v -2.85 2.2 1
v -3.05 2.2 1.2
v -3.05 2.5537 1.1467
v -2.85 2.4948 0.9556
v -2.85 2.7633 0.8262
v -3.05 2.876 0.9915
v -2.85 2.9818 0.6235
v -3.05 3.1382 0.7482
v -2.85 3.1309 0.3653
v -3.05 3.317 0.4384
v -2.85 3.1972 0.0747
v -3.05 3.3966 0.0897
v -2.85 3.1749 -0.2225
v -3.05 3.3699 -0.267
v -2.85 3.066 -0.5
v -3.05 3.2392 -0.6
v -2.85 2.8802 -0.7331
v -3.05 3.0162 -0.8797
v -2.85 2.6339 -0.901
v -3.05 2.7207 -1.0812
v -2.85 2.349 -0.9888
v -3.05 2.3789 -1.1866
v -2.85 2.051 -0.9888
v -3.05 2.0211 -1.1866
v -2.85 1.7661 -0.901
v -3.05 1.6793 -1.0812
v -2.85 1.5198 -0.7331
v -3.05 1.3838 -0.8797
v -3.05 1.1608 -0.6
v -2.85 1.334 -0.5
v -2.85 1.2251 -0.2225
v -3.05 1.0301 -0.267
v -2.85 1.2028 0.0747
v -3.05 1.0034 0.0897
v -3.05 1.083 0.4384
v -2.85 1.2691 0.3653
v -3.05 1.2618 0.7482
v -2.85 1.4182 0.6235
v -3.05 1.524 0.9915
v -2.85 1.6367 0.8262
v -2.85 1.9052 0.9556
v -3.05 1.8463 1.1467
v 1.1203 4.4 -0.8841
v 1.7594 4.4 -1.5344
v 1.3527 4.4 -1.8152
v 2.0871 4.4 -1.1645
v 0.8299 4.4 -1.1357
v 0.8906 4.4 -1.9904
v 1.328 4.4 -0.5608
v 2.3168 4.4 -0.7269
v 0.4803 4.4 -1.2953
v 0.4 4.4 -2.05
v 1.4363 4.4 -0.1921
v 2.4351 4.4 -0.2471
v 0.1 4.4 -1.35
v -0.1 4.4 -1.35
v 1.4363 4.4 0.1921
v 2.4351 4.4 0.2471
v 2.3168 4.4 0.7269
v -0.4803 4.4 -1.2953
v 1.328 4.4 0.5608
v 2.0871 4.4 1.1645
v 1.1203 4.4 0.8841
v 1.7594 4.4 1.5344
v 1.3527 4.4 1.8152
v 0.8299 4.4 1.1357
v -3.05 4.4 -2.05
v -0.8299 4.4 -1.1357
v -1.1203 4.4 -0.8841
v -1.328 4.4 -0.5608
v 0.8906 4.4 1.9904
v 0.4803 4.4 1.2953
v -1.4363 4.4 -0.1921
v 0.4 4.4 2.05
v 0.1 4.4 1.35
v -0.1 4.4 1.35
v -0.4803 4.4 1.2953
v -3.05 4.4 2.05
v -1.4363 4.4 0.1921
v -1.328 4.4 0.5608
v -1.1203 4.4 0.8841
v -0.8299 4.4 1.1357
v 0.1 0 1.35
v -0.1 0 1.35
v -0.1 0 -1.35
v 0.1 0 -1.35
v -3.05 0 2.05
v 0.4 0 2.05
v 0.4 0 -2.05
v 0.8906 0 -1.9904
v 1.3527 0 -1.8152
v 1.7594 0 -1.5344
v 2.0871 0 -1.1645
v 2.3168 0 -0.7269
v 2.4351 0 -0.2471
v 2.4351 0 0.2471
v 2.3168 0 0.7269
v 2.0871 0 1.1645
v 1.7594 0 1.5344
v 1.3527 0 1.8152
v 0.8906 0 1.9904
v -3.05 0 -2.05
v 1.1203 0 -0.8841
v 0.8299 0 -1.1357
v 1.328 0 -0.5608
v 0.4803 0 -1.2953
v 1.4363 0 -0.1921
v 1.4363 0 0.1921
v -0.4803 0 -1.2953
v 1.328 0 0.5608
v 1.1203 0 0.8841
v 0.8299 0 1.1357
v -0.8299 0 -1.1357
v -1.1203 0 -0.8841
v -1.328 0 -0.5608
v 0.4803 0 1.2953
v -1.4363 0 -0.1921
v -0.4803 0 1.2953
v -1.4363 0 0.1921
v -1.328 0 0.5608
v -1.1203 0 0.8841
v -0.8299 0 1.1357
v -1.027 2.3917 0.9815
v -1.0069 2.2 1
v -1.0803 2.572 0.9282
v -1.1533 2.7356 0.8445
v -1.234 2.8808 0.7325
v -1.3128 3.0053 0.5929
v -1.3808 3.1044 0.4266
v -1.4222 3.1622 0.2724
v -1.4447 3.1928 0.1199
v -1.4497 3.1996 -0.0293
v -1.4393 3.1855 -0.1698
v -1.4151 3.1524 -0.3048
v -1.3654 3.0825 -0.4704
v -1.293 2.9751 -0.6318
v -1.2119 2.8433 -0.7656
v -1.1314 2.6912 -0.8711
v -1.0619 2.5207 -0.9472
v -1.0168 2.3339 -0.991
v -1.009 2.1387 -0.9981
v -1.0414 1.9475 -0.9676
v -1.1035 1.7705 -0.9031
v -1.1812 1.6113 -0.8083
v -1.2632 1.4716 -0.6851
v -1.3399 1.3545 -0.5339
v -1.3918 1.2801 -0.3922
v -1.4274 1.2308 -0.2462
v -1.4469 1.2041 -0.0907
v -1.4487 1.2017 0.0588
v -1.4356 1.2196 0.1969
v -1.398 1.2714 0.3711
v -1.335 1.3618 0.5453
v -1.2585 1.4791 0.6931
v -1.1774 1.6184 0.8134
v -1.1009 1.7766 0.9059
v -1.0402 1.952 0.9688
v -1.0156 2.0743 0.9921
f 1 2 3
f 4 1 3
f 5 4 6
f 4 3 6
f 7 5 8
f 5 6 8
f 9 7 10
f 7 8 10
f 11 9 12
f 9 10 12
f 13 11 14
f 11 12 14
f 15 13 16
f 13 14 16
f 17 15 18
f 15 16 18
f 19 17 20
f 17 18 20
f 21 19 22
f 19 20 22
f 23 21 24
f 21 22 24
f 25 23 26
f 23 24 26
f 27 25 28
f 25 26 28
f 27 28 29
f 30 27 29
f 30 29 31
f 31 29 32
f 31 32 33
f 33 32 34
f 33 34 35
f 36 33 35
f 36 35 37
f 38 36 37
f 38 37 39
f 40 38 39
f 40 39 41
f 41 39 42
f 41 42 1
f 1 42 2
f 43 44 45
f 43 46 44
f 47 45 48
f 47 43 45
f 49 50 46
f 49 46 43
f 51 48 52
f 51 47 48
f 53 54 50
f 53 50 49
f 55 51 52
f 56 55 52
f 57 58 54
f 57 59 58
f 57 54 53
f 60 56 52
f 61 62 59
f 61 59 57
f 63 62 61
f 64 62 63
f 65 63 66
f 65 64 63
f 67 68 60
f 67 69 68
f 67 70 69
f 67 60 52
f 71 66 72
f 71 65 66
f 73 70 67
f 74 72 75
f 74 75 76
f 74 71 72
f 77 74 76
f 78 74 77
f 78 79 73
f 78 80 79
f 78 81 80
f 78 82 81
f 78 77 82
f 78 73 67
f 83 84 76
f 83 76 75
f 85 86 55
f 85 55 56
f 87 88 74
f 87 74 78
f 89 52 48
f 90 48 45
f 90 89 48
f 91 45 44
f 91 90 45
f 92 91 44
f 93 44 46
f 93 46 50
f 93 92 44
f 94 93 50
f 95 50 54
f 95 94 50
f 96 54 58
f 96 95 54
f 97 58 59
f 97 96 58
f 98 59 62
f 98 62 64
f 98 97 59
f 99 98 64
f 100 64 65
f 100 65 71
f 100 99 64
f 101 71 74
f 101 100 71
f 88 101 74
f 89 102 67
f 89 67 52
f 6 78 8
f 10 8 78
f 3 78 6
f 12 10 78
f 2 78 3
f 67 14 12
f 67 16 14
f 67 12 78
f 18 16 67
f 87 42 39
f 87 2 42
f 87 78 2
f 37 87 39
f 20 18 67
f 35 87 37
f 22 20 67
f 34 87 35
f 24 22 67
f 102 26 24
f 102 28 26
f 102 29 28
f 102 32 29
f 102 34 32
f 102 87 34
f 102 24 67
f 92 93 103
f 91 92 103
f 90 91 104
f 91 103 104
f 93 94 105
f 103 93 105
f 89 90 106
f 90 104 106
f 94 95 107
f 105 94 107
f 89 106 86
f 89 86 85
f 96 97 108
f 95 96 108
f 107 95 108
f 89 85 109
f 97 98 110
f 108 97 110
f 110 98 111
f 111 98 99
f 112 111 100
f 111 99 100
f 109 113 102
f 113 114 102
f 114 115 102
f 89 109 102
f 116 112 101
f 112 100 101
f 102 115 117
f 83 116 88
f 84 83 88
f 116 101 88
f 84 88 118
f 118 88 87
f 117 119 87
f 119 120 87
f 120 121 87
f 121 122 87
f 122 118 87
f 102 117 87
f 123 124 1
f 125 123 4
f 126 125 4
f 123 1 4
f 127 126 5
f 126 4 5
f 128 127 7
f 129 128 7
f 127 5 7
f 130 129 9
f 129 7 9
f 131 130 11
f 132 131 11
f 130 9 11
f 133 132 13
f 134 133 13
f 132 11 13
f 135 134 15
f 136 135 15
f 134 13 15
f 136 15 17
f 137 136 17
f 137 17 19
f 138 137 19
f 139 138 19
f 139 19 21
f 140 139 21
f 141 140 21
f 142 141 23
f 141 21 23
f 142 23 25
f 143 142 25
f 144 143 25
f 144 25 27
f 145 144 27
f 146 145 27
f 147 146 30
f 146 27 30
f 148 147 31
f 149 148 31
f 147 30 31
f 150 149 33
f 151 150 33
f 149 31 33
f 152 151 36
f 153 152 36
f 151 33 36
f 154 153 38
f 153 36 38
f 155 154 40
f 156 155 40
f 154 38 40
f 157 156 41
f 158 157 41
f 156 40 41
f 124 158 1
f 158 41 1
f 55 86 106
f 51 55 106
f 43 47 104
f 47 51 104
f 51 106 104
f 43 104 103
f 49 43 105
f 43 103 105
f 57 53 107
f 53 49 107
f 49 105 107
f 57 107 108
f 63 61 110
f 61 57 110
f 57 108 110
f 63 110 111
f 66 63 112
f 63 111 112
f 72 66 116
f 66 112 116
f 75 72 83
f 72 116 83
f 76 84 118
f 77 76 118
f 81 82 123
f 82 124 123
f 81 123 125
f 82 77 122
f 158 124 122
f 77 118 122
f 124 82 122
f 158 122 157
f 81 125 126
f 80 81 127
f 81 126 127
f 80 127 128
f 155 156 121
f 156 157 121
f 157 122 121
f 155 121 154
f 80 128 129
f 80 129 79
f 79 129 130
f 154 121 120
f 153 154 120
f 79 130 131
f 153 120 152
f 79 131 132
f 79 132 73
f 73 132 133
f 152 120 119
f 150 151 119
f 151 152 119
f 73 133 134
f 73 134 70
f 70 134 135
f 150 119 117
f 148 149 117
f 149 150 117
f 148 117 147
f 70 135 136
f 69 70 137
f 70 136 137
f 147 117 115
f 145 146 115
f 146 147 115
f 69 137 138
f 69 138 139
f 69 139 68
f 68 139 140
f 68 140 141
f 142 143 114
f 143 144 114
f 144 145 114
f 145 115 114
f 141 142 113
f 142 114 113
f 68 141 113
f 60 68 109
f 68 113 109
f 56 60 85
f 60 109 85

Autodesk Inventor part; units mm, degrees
ref_plane "YZ Plane" through (0, 0, 0) normal (1, 0, 0) x (0, 1, 0)
ref_plane "XZ Plane" through (0, 0, 0) normal (0, 1, 0) x (-1, 0, 0)
ref_plane "XY Plane" through (0, 0, 0) normal (0, 0, 1) x (1, 0, 0)
sketch "Sketch1" plane through (0, 0, 0) normal (0, 1, 0) x (-1, 0, 0)
  circle A0 centre (-0.4, 0) radius 2.05
  line L0 (-0.4, 2.05) -> (3.05, 2.05)
  line L1 (3.05, 2.05) -> (3.05, -2.05)
  line L2 (3.05, -2.05) -> (-0.4, -2.05)
  line L3 (-2.45, 0) -> (-2.45, -1.163)
  line L4 (-1.45, 0) -> (1.45, 0) construction
  line L5 (-0.1, -1.35) -> (0.1, -1.35)
  line L6 (0.1, 1.35) -> (-0.1, 1.35)
  arc A1 (-0.1, 1.35) -> (-0.1, -1.35) centre (-0.1, 0) ccw
  arc A2 (0.1, -1.35) -> (0.1, 1.35) centre (0.1, 0) ccw
  point P0 (0, 0)
  point P1 (0, 0)
  dimension "d1" = 4.1
  dimension "d2" = 5.5
  dimension "d3" = 2.7
  dimension "d4" = 2.9
  dimension "d5" = 1
extrude "Extrusion1" add sketch "Sketch1" along normal blind 4.4
sketch "Sketch2" plane through (-3.05, 0, -2.05) normal (-1, 0, 0) x (0, 0, 1)
  line L0 (0, 0) -> (4.1, 0) projected
  line L1 (4.1, 0) -> (4.1, 4.4) projected
  line L2 (0, 4.4) -> (4.1, 4.4) projected
  line L3 (0, 0) -> (0, 4.4) projected
  circle A0 centre (2.05, 2.2) radius 1
  point P0 (2.05, 0)
  dimension "d8" = 2
extrude "Extrusion2" cut sketch "Sketch2" against normal up to surface contours A0
thread "Thread1" size "M2x0.4" class "6H" standard "ANSI Metric M Profile" full length
chamfer "Chamfer1" distance 0.2 angle 45 1 edges at (-3.05, 2.2, -1)
properties part number "metal_connector" material "Steel, Alloy"
